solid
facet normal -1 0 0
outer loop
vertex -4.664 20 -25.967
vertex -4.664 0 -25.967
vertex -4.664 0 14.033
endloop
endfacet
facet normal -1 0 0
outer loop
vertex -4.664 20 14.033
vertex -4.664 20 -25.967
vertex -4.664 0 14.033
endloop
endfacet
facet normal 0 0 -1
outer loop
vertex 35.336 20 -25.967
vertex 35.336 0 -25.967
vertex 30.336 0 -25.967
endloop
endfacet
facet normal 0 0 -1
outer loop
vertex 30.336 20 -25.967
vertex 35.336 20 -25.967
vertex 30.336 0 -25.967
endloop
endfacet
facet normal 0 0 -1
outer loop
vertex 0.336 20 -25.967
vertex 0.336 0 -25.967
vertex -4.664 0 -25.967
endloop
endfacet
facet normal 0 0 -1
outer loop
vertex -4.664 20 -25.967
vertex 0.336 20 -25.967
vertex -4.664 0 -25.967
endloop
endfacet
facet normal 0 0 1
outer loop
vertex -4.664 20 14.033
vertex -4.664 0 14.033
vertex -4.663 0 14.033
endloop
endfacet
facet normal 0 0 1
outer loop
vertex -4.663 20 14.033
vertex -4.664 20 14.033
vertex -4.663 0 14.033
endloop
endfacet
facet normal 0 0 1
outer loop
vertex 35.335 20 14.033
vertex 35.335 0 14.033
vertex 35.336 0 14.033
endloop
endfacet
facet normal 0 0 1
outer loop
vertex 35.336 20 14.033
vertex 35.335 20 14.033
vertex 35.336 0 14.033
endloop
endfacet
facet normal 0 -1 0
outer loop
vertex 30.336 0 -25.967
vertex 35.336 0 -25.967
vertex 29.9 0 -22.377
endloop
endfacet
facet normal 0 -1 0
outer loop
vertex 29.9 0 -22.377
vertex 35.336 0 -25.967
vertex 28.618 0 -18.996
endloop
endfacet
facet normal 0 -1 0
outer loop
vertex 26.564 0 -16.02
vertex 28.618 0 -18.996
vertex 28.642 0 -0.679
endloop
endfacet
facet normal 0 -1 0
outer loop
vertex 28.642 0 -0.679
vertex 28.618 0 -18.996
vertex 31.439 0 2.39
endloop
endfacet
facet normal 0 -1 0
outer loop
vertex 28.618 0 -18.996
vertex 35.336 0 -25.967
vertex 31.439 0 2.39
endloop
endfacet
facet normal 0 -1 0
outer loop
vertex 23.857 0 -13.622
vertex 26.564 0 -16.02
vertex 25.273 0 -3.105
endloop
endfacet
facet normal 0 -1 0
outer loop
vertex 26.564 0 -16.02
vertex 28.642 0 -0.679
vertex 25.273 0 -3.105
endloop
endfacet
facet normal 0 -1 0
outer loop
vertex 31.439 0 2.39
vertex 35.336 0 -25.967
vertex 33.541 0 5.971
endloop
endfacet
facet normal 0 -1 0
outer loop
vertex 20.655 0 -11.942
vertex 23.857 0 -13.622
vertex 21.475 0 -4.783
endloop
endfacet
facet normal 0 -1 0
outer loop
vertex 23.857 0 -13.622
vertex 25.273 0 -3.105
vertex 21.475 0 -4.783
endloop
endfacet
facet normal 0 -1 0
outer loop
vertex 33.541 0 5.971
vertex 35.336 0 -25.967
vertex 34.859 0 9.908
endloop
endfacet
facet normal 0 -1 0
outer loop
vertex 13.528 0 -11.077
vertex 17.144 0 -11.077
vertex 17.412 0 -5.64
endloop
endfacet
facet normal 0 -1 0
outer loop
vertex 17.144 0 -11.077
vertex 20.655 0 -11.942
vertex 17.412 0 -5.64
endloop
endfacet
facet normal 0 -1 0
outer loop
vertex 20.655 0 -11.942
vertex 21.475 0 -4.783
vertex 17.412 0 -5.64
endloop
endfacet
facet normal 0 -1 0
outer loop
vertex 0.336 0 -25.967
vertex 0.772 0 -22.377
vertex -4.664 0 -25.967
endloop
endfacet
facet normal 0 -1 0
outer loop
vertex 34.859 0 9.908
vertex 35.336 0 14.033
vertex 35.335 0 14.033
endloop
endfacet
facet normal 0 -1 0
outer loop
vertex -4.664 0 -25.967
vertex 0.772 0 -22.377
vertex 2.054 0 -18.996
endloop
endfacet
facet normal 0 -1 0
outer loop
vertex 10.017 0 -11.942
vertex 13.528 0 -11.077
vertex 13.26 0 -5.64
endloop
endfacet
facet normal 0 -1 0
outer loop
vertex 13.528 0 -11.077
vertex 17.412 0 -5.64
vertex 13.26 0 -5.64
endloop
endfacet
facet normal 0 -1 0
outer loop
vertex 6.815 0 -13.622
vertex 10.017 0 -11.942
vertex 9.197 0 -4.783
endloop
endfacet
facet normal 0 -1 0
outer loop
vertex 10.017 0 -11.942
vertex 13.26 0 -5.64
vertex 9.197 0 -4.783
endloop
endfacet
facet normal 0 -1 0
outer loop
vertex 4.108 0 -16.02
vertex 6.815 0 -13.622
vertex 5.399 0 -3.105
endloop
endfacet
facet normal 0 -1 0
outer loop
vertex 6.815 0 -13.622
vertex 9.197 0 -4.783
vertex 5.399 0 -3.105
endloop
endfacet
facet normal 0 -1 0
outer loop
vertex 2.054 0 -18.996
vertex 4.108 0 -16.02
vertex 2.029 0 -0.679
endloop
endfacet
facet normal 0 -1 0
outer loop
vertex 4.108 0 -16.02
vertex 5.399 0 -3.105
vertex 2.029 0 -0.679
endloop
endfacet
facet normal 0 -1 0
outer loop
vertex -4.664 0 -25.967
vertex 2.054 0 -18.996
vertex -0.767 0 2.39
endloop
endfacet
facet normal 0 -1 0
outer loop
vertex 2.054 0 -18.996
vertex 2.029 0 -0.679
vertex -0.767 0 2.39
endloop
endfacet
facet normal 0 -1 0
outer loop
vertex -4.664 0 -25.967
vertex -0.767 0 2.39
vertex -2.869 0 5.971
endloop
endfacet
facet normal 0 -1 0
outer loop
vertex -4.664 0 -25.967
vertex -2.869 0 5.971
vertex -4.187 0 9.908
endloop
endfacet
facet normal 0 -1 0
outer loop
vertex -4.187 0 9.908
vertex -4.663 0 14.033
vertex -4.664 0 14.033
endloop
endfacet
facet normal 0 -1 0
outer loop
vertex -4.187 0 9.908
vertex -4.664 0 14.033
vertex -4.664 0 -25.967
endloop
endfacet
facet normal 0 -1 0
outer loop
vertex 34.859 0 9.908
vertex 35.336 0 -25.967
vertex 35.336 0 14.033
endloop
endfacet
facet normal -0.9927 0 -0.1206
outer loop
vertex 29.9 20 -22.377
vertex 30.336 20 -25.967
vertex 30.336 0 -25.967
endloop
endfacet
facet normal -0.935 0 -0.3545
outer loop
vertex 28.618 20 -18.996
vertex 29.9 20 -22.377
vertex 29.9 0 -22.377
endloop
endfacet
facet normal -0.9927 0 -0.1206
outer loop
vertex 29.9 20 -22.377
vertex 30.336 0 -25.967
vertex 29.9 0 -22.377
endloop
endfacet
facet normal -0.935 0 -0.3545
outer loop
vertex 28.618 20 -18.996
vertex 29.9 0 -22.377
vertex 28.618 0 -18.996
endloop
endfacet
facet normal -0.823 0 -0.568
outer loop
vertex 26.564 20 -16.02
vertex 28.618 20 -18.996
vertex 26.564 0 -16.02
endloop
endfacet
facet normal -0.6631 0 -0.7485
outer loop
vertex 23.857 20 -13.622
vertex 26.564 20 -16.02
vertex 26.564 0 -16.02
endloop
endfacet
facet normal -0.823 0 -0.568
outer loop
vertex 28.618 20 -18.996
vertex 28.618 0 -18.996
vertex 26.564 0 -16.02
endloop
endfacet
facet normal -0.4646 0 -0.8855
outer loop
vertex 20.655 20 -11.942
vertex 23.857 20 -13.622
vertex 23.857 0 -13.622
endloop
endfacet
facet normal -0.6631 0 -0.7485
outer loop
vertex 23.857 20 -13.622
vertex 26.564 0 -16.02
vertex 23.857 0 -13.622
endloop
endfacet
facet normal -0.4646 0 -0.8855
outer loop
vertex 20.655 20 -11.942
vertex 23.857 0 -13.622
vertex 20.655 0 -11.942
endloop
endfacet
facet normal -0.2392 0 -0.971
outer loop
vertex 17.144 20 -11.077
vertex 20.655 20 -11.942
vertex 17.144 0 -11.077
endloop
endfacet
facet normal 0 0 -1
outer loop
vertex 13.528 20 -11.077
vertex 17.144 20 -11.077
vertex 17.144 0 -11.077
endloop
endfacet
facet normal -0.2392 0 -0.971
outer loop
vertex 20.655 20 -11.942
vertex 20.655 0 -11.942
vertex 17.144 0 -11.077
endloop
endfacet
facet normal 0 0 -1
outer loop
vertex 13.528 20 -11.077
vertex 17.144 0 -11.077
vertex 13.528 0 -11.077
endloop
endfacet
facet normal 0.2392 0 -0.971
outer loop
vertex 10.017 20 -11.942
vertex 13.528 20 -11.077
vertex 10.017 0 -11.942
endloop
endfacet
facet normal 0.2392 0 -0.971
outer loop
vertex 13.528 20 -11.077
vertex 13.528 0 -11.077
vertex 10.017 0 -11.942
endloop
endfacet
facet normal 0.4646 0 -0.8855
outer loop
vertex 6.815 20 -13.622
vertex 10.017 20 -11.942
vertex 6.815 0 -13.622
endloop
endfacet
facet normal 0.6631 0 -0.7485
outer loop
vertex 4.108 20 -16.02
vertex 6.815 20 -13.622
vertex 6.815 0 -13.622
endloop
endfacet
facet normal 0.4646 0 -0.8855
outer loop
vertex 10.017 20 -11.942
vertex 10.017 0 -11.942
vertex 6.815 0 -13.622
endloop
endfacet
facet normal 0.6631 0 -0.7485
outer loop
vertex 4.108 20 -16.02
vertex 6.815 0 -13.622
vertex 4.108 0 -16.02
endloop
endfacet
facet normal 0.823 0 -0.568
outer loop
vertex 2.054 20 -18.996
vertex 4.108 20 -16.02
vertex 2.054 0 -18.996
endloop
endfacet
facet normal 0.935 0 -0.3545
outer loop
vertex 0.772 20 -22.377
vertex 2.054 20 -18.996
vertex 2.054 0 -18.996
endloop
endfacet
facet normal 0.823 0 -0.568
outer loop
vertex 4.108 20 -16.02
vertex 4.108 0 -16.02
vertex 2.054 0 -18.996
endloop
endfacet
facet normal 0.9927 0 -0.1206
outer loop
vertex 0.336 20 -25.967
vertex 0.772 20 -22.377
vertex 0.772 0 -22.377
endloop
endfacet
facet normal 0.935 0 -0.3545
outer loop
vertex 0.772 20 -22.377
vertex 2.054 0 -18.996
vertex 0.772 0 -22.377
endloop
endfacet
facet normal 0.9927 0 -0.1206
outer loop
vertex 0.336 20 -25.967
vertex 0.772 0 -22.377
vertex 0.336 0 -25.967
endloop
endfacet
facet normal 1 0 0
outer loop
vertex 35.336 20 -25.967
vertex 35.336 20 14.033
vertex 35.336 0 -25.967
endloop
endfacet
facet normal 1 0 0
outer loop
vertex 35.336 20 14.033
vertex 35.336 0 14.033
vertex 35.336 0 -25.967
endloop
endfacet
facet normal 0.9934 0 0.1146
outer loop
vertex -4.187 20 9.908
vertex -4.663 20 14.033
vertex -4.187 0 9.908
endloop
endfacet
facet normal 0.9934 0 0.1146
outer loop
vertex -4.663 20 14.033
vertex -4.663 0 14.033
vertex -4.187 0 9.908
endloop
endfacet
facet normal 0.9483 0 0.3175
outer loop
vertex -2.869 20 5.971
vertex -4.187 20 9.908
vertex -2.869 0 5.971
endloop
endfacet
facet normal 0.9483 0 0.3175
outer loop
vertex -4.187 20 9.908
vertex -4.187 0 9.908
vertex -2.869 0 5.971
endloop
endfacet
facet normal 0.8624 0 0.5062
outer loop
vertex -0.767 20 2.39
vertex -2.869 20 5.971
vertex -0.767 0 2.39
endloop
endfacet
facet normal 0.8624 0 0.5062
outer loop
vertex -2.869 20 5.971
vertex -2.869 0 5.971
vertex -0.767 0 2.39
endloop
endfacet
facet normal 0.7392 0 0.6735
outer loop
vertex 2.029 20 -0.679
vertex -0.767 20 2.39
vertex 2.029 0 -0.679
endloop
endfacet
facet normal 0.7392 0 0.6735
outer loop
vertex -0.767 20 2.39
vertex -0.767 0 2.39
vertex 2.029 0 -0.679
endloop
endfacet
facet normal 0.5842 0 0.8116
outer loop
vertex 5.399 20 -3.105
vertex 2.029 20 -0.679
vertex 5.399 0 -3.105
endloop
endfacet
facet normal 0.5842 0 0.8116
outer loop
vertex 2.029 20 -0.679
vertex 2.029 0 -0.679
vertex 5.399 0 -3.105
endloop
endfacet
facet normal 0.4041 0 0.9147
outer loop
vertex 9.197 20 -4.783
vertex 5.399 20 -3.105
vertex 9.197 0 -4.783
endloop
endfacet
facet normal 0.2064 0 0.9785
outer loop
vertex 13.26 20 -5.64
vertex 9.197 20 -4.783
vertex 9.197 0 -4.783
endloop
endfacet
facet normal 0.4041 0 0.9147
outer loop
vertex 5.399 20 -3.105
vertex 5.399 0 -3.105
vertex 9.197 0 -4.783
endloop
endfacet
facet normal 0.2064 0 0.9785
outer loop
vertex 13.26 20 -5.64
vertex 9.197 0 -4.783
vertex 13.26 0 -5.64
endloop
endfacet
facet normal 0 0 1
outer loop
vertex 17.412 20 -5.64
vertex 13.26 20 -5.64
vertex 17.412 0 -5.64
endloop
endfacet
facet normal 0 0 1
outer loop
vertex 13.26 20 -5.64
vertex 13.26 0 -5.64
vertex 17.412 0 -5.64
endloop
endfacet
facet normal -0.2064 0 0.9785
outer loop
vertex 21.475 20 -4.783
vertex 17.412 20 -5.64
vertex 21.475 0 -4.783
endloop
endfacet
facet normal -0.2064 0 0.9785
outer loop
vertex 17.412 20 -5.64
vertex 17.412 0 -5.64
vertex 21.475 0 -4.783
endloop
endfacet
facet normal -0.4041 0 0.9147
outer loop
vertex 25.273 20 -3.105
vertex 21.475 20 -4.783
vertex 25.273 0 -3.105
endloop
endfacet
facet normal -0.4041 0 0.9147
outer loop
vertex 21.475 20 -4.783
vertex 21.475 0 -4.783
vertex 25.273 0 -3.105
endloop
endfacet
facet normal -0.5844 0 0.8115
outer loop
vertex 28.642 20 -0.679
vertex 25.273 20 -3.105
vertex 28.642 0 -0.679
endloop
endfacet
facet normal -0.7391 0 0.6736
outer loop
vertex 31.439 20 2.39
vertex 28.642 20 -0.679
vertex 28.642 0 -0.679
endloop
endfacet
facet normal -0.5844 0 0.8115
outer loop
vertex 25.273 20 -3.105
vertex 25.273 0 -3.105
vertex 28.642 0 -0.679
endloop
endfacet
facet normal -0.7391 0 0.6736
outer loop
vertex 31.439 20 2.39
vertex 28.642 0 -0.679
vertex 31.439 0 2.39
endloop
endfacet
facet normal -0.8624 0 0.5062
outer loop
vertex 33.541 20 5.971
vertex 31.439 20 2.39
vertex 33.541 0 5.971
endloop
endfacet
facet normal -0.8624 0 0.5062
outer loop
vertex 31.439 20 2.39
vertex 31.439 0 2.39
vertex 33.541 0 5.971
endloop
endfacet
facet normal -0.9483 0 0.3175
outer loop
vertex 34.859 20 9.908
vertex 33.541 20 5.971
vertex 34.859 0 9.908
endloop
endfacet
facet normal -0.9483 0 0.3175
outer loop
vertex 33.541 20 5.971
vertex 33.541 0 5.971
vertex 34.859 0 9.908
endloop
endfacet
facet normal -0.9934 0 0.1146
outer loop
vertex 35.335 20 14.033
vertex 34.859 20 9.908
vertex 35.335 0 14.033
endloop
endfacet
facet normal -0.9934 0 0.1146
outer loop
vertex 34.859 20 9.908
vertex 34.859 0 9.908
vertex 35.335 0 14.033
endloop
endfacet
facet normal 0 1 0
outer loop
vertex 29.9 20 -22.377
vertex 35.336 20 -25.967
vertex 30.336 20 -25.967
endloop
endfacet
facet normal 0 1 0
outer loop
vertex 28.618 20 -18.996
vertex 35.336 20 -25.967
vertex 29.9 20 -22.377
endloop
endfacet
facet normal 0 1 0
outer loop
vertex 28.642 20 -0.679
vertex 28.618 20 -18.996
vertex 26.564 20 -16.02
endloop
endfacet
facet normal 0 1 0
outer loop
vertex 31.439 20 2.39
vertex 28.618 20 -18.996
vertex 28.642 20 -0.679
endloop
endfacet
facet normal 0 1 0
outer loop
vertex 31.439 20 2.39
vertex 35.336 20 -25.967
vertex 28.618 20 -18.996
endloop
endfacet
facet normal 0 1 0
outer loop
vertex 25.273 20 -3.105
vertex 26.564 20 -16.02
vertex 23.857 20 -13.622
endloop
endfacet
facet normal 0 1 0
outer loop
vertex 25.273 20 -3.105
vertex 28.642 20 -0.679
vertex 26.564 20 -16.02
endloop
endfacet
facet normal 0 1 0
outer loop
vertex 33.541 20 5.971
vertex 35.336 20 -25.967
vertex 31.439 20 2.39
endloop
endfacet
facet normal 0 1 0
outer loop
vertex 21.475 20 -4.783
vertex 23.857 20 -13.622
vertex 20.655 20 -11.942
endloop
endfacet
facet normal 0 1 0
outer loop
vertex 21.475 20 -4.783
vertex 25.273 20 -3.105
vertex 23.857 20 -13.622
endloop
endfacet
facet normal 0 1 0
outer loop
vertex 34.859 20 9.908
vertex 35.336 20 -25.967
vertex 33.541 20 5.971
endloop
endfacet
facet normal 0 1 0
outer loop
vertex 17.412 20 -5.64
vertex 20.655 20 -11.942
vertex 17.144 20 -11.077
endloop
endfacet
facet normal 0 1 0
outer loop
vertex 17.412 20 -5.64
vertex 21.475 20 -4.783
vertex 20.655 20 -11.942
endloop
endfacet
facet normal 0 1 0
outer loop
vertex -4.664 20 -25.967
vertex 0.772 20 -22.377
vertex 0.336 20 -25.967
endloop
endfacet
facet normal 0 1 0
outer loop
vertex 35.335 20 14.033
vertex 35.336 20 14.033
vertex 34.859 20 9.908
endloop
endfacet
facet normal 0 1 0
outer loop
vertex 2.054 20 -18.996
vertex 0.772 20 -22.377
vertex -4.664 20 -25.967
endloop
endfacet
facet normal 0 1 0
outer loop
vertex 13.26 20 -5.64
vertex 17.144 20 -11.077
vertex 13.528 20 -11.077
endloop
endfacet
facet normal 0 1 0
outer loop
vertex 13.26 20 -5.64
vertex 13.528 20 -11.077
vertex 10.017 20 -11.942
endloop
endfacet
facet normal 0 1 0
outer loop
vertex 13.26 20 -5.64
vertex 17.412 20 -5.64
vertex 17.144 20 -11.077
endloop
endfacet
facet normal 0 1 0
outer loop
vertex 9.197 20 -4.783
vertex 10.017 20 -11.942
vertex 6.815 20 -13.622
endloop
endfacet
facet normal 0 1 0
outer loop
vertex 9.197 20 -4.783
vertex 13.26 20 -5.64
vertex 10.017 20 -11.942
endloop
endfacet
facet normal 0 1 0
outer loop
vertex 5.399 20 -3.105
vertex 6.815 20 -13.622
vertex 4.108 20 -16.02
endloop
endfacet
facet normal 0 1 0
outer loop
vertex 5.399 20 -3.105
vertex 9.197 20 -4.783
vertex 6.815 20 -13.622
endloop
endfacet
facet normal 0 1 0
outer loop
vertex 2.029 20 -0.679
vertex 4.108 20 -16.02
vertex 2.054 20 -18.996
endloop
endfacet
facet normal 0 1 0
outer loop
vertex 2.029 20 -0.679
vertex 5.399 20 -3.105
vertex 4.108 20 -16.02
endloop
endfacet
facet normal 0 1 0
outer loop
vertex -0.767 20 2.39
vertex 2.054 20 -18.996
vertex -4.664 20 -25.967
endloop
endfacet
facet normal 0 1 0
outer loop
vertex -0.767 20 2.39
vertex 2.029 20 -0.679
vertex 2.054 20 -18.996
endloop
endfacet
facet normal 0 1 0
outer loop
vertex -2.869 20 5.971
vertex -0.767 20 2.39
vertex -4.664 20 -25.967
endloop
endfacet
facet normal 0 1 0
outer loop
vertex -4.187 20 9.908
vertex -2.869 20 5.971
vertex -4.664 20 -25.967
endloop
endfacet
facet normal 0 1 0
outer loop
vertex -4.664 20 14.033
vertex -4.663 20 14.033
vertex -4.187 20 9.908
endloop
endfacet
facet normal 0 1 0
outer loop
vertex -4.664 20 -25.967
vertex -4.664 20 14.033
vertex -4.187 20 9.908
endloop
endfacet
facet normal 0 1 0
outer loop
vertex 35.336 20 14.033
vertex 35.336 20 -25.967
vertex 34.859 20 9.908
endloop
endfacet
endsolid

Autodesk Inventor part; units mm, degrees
ref_plane "YZ Plane" through (0, 0, 0) normal (1, 0, 0) x (0, 1, 0)
ref_plane "XZ Plane" through (0, 0, 0) normal (0, 1, 0) x (-1, 0, 0)
ref_plane "XY Plane" through (0, 0, 0) normal (0, 0, 1) x (1, 0, 0)
sketch "スケッチ1" plane through (0, 0, 0) normal (0, 1, 0) x (-1, 0, 0)
  line L0 (4.6641, 14.0328) -> (-35.3359, 14.0328)
  line L1 (-35.3359, 14.0328) -> (-35.3359, -25.9672)
  line L2 (-35.3359, -25.9672) -> (4.6641, -25.9672)
  line L3 (4.6641, -25.9672) -> (4.6641, 14.0328)
  point P0 (0, 0)
  dimension "d0" = 40
  dimension "d1" = 40
extrude "押し出し1" add sketch "スケッチ1" along normal blind 20
sketch "スケッチ2" plane through (0, 20, 0) normal (0, 1, 0) x (1, 0, 0)
  line L0 (35.3359, 25.9672) -> (-4.6641, 25.9672) projected
  circle A0 centre (15.3359, 25.9672) radius 15
  line L1 (-4.6641, -14.0328) -> (35.3359, -14.0328) projected
  circle A1 centre (15.3359, -14.2518) radius 20.0012
  point P0 (0, 0)
  dimension "d4" = 30
hole "穴1" at (15.3359, 20, 14.2518) direction (0, -1, 0) diameter 40 depth 20
sketch "スケッチ3" plane through (0, 20, 0) normal (0, 1, 0) x (1, 0, 0)
  line L0 (35.3359, 25.9672) -> (-4.6641, 25.9672) projected
  circle A0 centre (15.3359, 25.9672) radius 15
  point P0 (0, 0)
  dimension "d12" = 30
hole "穴2" at (15.3359, 20, -25.9672) direction (0, -1, 0) diameter 30 depth 20
equation "\"BendRadius\" = Thickness"
equation "\"BendReliefWidth\" = Thickness"
equation "\"BendReliefDepth\" = 0.5 * Thickness"
equation "\"CornerReliefSize\" = 4 * Thickness"
equation "\"MinimumRemnant\" = 2 * Thickness"
equation "\"TransitionRadius\" = BendRadius"
equation "\"JacobiRadiusSize\" = BendRadius"
equation "\"GapSize\" = Thickness"
equation "\"Thickness\" = 0.5"
